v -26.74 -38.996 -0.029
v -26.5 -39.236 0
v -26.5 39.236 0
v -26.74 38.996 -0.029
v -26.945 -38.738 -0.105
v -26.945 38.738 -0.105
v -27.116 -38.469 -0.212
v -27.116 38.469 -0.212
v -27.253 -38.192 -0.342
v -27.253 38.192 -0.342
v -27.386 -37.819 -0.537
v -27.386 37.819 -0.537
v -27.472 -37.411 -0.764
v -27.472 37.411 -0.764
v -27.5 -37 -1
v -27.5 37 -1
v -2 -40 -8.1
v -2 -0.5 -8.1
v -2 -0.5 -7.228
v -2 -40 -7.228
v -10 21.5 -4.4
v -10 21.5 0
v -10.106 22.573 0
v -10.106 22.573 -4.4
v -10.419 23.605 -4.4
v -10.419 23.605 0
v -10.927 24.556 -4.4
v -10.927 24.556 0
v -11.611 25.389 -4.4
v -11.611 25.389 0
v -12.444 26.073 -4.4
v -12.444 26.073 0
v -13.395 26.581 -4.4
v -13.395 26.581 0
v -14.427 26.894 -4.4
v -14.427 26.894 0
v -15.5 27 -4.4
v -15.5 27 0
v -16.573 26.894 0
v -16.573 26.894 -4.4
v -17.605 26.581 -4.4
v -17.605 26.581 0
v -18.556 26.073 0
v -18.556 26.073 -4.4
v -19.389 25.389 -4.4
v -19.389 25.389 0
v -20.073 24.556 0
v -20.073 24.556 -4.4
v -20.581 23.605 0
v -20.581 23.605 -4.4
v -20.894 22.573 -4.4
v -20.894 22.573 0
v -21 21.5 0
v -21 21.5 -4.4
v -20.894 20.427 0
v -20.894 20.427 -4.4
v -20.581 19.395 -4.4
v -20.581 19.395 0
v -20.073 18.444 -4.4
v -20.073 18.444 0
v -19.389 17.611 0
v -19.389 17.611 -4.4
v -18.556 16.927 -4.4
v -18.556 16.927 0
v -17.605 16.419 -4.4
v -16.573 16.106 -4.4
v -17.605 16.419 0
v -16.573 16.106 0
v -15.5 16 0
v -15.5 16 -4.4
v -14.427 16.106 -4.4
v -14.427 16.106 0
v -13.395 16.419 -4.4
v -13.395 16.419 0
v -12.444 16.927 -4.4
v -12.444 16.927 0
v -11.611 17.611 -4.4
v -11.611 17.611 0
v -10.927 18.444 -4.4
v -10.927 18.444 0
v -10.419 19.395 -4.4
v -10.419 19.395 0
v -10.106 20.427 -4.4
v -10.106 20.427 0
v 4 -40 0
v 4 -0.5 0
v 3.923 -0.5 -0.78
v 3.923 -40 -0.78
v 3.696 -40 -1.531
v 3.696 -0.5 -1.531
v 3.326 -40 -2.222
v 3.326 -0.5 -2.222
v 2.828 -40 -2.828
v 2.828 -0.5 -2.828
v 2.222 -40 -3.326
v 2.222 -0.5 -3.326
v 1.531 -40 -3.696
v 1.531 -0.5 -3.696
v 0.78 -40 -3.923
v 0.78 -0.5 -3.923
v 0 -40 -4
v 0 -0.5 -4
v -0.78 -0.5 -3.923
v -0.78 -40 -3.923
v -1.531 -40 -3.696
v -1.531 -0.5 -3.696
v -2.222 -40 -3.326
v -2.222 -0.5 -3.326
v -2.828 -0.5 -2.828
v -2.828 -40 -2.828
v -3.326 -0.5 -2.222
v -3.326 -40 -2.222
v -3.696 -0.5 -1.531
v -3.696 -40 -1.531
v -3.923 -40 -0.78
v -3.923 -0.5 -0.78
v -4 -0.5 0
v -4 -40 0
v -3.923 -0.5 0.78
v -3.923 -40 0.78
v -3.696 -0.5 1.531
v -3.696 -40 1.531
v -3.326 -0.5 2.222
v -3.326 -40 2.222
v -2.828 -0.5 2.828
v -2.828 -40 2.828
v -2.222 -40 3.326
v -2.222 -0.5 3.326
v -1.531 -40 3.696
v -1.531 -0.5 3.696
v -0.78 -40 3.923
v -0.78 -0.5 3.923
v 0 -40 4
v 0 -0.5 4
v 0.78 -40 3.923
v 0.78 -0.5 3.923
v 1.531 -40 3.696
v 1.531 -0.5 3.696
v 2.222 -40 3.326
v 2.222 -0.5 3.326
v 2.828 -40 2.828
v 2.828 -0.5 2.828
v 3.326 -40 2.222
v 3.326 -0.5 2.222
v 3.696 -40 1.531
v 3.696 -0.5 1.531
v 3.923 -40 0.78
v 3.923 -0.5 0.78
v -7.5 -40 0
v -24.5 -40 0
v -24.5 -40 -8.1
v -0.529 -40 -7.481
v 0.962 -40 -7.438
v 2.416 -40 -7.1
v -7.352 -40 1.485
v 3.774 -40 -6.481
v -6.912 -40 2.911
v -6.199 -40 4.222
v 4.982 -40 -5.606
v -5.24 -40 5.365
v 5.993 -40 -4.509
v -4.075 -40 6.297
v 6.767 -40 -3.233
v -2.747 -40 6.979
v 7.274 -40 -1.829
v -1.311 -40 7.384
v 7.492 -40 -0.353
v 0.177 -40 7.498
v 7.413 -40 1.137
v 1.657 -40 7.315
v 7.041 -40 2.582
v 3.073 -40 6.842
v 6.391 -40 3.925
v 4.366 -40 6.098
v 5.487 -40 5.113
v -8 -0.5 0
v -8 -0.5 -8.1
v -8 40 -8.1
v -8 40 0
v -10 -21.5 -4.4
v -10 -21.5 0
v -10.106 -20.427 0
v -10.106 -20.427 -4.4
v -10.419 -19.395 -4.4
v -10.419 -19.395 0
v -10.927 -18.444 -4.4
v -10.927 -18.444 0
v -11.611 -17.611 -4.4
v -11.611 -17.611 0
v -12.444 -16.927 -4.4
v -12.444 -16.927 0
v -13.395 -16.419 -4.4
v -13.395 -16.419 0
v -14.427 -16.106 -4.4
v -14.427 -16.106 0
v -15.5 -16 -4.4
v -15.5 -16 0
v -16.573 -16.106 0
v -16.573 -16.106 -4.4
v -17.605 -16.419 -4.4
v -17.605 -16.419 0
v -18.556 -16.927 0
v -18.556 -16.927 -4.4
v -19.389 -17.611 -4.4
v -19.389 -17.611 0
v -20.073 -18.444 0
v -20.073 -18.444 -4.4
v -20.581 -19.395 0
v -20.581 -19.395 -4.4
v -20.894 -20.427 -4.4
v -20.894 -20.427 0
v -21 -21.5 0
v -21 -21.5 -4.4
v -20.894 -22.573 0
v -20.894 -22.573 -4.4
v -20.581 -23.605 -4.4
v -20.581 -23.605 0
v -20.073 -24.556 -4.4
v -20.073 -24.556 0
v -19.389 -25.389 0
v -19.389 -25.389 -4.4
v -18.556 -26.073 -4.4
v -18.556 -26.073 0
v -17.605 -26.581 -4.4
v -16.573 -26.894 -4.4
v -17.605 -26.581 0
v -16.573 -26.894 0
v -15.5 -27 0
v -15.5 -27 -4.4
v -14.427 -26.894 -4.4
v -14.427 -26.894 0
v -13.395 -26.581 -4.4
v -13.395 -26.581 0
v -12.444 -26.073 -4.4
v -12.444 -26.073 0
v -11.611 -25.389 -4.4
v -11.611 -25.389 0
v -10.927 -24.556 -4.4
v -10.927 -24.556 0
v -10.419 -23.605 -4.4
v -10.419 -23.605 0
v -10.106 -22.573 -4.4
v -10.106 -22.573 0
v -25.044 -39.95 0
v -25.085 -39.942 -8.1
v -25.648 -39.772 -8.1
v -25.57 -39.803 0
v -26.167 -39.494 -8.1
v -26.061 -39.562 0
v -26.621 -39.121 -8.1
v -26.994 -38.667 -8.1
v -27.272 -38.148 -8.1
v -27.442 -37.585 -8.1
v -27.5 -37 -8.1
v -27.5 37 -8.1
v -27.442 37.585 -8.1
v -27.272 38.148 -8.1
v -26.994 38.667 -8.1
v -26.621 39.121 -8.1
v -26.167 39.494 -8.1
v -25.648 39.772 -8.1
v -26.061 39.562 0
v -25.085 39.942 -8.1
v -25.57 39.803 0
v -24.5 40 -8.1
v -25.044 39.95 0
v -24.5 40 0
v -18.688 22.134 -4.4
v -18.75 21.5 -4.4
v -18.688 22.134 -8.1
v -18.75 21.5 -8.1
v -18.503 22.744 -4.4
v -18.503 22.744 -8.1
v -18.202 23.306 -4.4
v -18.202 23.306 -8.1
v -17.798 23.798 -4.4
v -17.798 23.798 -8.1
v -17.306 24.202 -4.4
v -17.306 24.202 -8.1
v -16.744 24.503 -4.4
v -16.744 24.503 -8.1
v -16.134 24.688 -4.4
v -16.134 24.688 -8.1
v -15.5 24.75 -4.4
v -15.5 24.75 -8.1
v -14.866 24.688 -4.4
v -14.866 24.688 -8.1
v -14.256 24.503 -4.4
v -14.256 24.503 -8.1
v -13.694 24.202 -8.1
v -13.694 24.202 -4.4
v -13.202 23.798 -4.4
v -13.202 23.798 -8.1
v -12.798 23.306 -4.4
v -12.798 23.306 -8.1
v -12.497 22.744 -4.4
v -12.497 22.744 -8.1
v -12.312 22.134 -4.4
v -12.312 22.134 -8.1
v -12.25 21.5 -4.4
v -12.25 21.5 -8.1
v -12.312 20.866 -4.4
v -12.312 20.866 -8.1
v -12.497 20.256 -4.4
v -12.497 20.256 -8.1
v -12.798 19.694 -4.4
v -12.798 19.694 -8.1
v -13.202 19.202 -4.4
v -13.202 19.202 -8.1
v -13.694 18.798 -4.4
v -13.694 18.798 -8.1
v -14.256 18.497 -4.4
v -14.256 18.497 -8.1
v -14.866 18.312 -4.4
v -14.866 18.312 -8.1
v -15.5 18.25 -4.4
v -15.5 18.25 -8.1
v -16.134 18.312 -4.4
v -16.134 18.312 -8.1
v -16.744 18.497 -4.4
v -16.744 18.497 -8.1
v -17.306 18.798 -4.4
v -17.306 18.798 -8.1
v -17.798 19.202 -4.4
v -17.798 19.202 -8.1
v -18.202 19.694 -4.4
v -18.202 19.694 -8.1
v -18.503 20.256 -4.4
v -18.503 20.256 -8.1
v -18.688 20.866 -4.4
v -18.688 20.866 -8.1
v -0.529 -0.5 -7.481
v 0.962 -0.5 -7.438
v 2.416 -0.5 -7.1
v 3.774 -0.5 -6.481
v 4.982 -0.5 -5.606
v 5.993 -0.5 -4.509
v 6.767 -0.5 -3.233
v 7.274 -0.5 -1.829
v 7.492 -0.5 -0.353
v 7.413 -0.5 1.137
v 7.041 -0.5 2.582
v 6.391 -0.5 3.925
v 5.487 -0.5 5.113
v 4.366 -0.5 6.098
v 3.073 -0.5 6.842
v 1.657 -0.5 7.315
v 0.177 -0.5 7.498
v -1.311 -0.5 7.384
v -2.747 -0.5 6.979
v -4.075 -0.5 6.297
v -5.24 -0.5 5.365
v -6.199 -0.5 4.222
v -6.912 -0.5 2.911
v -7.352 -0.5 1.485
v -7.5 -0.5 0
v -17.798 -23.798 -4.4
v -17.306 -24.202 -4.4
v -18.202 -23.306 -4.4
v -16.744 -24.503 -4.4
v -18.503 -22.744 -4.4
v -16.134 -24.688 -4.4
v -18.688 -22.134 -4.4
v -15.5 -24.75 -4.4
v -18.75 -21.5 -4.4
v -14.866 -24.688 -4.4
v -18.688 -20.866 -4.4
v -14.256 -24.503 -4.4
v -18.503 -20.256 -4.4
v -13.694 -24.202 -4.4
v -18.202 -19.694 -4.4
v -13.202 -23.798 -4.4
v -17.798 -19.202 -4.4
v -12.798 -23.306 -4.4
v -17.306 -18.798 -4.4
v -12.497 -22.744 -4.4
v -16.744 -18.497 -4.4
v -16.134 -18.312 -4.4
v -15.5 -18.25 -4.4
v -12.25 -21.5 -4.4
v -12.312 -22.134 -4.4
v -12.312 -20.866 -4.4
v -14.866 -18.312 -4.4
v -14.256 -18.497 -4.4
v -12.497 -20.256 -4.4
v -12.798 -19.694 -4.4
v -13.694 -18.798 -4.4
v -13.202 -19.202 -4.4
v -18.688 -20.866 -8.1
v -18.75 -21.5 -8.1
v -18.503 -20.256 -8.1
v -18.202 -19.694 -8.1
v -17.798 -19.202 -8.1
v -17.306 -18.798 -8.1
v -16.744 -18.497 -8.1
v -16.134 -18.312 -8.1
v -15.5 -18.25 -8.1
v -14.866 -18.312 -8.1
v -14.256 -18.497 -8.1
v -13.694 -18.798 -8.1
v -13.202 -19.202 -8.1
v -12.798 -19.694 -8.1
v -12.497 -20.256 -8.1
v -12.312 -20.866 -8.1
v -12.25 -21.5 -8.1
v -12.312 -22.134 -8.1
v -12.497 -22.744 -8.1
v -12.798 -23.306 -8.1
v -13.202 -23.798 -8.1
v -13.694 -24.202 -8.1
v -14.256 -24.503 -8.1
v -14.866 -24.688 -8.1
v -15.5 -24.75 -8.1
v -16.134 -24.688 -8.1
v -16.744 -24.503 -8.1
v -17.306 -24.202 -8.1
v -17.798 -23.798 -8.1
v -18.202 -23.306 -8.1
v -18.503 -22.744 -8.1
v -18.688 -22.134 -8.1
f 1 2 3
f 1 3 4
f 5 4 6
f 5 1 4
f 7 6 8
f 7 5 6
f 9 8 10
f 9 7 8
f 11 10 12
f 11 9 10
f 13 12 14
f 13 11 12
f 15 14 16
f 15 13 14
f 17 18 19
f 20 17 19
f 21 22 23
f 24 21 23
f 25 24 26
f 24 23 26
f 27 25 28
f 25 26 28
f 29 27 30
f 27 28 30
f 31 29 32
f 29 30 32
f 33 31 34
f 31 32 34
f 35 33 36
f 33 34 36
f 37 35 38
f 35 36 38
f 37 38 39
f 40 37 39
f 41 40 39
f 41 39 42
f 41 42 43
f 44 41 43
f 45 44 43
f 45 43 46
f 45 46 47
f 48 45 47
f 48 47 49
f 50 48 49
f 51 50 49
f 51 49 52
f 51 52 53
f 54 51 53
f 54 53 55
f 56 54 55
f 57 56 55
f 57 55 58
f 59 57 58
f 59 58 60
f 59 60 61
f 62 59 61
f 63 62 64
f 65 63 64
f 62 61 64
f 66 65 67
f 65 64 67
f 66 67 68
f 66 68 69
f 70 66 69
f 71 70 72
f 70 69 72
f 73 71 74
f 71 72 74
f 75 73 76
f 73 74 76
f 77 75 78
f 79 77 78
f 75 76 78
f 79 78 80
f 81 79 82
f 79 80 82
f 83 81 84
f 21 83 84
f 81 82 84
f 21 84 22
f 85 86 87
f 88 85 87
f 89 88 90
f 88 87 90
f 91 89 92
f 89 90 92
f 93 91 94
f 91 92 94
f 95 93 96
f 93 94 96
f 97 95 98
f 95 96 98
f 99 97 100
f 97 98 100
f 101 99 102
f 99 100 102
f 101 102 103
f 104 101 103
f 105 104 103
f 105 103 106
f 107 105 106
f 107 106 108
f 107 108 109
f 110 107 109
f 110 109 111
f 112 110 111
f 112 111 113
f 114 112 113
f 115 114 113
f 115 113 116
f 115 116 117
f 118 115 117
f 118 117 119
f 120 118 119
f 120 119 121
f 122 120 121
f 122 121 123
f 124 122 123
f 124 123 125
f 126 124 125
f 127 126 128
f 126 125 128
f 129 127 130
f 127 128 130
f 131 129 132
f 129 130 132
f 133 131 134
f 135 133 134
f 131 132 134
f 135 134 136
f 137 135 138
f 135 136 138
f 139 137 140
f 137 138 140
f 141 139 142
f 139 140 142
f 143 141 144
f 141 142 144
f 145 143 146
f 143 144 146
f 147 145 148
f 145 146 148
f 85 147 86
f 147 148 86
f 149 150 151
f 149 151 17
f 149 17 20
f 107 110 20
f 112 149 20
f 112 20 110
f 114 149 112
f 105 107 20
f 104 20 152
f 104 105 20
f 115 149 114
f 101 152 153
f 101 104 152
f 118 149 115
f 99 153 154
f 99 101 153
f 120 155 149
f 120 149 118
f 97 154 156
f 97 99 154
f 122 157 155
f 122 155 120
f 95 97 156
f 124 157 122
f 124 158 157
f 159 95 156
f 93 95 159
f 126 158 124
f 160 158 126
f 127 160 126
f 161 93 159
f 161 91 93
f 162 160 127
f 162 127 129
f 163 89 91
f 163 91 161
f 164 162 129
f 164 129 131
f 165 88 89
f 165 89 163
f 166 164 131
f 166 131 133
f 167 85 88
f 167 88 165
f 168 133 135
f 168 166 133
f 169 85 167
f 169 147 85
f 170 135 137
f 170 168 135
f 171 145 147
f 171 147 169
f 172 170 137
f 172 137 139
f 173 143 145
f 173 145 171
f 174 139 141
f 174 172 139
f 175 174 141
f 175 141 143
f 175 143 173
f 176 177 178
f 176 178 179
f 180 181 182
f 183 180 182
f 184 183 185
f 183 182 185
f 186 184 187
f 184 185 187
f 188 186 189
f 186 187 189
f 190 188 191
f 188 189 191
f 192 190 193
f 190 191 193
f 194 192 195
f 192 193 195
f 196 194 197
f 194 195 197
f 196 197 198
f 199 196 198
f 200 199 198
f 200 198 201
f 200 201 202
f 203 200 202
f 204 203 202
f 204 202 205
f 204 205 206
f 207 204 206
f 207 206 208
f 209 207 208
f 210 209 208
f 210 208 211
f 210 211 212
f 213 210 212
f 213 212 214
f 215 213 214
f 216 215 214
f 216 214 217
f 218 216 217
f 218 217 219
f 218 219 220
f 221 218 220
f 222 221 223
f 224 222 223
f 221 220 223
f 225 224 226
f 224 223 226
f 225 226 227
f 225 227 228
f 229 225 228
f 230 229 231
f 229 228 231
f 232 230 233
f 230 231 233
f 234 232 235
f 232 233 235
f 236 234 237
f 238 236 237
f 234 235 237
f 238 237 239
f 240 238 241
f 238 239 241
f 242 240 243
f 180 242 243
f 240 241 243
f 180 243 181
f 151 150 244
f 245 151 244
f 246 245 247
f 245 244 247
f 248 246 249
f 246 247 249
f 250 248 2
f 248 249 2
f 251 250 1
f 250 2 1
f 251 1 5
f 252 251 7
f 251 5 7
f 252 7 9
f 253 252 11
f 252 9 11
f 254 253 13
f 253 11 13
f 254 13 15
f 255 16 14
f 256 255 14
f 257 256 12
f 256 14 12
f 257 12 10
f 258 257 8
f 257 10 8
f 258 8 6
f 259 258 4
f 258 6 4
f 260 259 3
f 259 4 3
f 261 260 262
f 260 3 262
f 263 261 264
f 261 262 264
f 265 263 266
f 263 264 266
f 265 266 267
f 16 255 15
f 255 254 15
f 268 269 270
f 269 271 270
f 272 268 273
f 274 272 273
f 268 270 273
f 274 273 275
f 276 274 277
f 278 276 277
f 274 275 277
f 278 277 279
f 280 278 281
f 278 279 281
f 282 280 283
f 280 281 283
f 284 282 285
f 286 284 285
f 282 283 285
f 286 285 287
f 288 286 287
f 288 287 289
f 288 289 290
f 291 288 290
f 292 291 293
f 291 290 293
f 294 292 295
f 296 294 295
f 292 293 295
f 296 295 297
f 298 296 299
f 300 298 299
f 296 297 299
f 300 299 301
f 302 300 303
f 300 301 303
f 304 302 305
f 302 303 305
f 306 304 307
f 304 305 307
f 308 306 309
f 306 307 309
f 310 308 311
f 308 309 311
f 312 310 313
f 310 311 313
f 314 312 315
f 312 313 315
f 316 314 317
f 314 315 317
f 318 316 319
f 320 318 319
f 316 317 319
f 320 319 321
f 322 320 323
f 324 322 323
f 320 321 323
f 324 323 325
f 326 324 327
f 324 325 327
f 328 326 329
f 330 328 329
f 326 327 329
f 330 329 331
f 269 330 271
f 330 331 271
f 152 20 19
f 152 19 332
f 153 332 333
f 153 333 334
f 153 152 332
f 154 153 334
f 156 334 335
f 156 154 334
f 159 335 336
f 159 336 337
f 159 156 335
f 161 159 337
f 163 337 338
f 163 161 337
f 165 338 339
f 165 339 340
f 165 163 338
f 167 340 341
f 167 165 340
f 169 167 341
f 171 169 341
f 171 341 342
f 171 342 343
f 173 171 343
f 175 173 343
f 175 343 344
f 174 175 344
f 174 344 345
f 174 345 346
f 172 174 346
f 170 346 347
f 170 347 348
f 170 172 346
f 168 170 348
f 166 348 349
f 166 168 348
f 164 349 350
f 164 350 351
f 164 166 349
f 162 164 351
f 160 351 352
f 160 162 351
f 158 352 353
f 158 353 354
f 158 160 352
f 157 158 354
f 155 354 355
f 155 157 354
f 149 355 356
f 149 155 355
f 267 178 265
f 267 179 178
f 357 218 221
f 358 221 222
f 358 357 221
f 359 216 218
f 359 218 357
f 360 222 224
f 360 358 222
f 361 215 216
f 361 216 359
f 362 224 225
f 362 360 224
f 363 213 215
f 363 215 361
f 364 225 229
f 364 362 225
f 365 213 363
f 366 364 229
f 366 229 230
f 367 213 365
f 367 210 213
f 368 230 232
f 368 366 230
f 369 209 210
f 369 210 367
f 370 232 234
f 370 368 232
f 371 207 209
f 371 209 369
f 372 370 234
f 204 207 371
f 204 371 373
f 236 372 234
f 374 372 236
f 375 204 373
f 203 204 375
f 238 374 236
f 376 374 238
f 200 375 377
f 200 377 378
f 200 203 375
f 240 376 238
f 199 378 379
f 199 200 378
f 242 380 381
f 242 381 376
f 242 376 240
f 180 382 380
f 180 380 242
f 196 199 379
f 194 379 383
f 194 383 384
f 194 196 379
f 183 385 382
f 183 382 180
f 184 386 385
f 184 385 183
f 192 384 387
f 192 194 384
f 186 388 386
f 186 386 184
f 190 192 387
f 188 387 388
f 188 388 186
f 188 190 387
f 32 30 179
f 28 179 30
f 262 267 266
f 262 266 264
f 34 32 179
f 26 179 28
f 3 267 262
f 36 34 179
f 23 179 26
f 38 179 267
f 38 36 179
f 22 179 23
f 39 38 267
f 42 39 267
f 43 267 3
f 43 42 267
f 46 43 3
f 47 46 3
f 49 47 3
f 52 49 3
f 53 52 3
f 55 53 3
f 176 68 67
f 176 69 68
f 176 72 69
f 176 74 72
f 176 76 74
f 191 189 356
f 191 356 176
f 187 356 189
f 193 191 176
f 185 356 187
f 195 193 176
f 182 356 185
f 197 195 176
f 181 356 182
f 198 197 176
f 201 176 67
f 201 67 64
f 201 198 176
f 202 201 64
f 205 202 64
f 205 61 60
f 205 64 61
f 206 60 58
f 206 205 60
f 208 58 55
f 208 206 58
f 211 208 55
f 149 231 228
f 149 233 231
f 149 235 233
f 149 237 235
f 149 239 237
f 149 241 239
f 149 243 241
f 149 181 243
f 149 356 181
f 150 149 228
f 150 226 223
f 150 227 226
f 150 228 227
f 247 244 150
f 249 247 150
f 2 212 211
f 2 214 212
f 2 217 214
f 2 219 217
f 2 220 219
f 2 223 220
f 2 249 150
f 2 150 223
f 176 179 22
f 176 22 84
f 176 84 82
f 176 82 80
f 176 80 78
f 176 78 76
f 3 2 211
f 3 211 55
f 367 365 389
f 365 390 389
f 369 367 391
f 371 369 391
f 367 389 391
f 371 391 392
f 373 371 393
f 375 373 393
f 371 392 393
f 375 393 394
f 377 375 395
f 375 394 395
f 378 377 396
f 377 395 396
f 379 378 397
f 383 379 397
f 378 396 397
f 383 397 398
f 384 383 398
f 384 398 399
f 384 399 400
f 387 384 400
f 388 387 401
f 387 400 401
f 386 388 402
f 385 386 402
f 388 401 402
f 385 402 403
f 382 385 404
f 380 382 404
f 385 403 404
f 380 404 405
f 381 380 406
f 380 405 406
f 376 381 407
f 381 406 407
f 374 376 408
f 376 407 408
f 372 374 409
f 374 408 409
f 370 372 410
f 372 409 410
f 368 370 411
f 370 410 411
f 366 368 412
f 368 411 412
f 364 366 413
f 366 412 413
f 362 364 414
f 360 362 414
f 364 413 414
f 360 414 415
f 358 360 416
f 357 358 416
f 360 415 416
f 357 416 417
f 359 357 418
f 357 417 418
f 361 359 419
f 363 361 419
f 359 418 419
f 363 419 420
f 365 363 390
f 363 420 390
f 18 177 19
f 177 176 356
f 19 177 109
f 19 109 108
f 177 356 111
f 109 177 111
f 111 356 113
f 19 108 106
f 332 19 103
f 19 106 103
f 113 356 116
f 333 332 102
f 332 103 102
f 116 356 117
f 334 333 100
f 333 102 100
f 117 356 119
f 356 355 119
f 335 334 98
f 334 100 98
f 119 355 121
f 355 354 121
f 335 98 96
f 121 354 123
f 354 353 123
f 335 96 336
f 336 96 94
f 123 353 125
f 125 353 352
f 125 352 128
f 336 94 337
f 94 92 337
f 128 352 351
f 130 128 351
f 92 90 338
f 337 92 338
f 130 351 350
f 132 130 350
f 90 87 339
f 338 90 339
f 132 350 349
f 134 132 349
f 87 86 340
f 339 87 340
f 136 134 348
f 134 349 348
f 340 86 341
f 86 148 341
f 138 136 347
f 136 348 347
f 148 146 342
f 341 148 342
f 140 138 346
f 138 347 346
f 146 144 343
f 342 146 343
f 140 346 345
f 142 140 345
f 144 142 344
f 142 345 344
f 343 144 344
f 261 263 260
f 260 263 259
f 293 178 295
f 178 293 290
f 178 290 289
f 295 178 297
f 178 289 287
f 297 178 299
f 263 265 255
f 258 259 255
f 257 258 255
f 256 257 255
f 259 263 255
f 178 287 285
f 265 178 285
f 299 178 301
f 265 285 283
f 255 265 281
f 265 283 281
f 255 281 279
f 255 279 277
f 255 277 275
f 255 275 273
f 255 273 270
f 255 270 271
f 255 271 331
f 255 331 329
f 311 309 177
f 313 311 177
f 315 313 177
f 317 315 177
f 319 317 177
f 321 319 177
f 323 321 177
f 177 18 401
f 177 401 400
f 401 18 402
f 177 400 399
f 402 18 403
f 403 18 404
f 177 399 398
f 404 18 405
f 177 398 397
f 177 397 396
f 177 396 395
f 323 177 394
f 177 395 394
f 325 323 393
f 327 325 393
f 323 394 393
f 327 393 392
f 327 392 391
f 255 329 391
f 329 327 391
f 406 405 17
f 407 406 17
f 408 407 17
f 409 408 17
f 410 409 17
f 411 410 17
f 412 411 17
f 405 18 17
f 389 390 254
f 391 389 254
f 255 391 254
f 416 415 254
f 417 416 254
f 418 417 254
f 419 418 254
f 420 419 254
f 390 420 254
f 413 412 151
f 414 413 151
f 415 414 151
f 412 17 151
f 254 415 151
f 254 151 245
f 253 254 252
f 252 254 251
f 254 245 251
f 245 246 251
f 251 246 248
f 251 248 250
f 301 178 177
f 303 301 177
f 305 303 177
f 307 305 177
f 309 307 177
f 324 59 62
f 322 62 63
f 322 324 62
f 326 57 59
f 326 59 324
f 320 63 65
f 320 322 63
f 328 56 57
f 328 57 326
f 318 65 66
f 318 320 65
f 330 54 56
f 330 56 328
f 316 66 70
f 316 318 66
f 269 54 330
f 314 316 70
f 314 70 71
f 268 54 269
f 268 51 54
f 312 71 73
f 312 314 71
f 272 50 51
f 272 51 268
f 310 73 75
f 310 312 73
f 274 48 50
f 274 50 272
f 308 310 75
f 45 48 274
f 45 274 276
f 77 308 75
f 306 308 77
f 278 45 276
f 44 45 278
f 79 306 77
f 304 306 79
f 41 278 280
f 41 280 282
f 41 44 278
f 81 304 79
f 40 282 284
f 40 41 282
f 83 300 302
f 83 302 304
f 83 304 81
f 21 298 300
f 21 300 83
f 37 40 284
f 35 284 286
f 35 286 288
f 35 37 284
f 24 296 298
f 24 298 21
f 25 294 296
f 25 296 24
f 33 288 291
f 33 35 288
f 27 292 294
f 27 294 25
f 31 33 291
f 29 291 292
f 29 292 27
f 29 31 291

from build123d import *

# Parameters (mm, degrees)
EXTRUDE1_DEPTH       = 39.5
SKETCH2_W            = 19.5
SKETCH2_H            = 8.1
EXTRUDE2_DEPTH       = 40.5
HOLEWZD1_D           = 8
HOLEWZD1_DEPTH       = 80.000025
HOLEWZD2_D           = 6.5
HOLEWZD2_CBORE_D     = 11
HOLEWZD2_CBORE_DEPTH = 4.4
FILLET1_R            = 1
FILLET2_R            = 3


with BuildPart() as part:
    # Sketch1 → Extrude1 (new body)
    with BuildSketch(Plane.XZ.offset(40)):
        with BuildLine():
            Line((-2, -8.1), (-2, -7.228416147))
            ThreePointArc((-2, -7.228416147), (5.968668193, 4.541475531), (-7.5, 0))
            Line((-7.5, 0), (-27.5, 0))
            Line((-27.5, 0), (-27.5, -8.1))
            Line((-27.5, -8.1), (-2, -8.1))
        make_face()
    extrude(amount=-EXTRUDE1_DEPTH)

    # Sketch2 → Extrude2 (add)
    with BuildSketch(Plane(origin=(0, -0.5, 0), x_dir=(-1, 0, 0), z_dir=(0, 1, 0))):
        with Locations((17.75, -4.05)):
            Rectangle(SKETCH2_W, SKETCH2_H)
    extrude(amount=EXTRUDE2_DEPTH)

    # HoleWzd1
    with Locations(Plane(origin=(0, -40, 0), x_dir=(-1, 0, 0), z_dir=(0, -1, 0))):
        with Locations((0, 0)):
            Hole(HOLEWZD1_D / 2, depth=HOLEWZD1_DEPTH)

    # HoleWzd2 (through all)
    with Locations(Plane.XY):
        with Locations((-15.5, -21.5), (-15.5, 21.5)):
            CounterBoreHole(HOLEWZD2_D / 2, HOLEWZD2_CBORE_D / 2, HOLEWZD2_CBORE_DEPTH)

    # Fillet1
    fillet1_edges = [part.edges().sort_by_distance(p)[0] for p in [
        (-27.5, 0, 0),
    ]]
    fillet(fillet1_edges, radius=FILLET1_R)

    # Fillet2
    # the kernel refuses this fillet: 3 mm, written as the material it takes off along each edge
    with BuildSketch(Plane(origin=(-27.5, -40, 6.5), x_dir=(1, 0, 0), z_dir=(0, 0, -1)), Plane(origin=(-27.5, 40, 6.5), x_dir=(0, -1, 0), z_dir=(0, 0, -1))) as fillet2_piece_1:
        with BuildLine():
            CenterArc((FILLET2_R, -FILLET2_R), FILLET2_R, 90, 90)
            Line((0, -FILLET2_R), (0, 0))
            Line((0, 0), (FILLET2_R, 0))
        make_face()
    extrude(amount=22.1, mode=Mode.SUBTRACT)


solid = part.part
